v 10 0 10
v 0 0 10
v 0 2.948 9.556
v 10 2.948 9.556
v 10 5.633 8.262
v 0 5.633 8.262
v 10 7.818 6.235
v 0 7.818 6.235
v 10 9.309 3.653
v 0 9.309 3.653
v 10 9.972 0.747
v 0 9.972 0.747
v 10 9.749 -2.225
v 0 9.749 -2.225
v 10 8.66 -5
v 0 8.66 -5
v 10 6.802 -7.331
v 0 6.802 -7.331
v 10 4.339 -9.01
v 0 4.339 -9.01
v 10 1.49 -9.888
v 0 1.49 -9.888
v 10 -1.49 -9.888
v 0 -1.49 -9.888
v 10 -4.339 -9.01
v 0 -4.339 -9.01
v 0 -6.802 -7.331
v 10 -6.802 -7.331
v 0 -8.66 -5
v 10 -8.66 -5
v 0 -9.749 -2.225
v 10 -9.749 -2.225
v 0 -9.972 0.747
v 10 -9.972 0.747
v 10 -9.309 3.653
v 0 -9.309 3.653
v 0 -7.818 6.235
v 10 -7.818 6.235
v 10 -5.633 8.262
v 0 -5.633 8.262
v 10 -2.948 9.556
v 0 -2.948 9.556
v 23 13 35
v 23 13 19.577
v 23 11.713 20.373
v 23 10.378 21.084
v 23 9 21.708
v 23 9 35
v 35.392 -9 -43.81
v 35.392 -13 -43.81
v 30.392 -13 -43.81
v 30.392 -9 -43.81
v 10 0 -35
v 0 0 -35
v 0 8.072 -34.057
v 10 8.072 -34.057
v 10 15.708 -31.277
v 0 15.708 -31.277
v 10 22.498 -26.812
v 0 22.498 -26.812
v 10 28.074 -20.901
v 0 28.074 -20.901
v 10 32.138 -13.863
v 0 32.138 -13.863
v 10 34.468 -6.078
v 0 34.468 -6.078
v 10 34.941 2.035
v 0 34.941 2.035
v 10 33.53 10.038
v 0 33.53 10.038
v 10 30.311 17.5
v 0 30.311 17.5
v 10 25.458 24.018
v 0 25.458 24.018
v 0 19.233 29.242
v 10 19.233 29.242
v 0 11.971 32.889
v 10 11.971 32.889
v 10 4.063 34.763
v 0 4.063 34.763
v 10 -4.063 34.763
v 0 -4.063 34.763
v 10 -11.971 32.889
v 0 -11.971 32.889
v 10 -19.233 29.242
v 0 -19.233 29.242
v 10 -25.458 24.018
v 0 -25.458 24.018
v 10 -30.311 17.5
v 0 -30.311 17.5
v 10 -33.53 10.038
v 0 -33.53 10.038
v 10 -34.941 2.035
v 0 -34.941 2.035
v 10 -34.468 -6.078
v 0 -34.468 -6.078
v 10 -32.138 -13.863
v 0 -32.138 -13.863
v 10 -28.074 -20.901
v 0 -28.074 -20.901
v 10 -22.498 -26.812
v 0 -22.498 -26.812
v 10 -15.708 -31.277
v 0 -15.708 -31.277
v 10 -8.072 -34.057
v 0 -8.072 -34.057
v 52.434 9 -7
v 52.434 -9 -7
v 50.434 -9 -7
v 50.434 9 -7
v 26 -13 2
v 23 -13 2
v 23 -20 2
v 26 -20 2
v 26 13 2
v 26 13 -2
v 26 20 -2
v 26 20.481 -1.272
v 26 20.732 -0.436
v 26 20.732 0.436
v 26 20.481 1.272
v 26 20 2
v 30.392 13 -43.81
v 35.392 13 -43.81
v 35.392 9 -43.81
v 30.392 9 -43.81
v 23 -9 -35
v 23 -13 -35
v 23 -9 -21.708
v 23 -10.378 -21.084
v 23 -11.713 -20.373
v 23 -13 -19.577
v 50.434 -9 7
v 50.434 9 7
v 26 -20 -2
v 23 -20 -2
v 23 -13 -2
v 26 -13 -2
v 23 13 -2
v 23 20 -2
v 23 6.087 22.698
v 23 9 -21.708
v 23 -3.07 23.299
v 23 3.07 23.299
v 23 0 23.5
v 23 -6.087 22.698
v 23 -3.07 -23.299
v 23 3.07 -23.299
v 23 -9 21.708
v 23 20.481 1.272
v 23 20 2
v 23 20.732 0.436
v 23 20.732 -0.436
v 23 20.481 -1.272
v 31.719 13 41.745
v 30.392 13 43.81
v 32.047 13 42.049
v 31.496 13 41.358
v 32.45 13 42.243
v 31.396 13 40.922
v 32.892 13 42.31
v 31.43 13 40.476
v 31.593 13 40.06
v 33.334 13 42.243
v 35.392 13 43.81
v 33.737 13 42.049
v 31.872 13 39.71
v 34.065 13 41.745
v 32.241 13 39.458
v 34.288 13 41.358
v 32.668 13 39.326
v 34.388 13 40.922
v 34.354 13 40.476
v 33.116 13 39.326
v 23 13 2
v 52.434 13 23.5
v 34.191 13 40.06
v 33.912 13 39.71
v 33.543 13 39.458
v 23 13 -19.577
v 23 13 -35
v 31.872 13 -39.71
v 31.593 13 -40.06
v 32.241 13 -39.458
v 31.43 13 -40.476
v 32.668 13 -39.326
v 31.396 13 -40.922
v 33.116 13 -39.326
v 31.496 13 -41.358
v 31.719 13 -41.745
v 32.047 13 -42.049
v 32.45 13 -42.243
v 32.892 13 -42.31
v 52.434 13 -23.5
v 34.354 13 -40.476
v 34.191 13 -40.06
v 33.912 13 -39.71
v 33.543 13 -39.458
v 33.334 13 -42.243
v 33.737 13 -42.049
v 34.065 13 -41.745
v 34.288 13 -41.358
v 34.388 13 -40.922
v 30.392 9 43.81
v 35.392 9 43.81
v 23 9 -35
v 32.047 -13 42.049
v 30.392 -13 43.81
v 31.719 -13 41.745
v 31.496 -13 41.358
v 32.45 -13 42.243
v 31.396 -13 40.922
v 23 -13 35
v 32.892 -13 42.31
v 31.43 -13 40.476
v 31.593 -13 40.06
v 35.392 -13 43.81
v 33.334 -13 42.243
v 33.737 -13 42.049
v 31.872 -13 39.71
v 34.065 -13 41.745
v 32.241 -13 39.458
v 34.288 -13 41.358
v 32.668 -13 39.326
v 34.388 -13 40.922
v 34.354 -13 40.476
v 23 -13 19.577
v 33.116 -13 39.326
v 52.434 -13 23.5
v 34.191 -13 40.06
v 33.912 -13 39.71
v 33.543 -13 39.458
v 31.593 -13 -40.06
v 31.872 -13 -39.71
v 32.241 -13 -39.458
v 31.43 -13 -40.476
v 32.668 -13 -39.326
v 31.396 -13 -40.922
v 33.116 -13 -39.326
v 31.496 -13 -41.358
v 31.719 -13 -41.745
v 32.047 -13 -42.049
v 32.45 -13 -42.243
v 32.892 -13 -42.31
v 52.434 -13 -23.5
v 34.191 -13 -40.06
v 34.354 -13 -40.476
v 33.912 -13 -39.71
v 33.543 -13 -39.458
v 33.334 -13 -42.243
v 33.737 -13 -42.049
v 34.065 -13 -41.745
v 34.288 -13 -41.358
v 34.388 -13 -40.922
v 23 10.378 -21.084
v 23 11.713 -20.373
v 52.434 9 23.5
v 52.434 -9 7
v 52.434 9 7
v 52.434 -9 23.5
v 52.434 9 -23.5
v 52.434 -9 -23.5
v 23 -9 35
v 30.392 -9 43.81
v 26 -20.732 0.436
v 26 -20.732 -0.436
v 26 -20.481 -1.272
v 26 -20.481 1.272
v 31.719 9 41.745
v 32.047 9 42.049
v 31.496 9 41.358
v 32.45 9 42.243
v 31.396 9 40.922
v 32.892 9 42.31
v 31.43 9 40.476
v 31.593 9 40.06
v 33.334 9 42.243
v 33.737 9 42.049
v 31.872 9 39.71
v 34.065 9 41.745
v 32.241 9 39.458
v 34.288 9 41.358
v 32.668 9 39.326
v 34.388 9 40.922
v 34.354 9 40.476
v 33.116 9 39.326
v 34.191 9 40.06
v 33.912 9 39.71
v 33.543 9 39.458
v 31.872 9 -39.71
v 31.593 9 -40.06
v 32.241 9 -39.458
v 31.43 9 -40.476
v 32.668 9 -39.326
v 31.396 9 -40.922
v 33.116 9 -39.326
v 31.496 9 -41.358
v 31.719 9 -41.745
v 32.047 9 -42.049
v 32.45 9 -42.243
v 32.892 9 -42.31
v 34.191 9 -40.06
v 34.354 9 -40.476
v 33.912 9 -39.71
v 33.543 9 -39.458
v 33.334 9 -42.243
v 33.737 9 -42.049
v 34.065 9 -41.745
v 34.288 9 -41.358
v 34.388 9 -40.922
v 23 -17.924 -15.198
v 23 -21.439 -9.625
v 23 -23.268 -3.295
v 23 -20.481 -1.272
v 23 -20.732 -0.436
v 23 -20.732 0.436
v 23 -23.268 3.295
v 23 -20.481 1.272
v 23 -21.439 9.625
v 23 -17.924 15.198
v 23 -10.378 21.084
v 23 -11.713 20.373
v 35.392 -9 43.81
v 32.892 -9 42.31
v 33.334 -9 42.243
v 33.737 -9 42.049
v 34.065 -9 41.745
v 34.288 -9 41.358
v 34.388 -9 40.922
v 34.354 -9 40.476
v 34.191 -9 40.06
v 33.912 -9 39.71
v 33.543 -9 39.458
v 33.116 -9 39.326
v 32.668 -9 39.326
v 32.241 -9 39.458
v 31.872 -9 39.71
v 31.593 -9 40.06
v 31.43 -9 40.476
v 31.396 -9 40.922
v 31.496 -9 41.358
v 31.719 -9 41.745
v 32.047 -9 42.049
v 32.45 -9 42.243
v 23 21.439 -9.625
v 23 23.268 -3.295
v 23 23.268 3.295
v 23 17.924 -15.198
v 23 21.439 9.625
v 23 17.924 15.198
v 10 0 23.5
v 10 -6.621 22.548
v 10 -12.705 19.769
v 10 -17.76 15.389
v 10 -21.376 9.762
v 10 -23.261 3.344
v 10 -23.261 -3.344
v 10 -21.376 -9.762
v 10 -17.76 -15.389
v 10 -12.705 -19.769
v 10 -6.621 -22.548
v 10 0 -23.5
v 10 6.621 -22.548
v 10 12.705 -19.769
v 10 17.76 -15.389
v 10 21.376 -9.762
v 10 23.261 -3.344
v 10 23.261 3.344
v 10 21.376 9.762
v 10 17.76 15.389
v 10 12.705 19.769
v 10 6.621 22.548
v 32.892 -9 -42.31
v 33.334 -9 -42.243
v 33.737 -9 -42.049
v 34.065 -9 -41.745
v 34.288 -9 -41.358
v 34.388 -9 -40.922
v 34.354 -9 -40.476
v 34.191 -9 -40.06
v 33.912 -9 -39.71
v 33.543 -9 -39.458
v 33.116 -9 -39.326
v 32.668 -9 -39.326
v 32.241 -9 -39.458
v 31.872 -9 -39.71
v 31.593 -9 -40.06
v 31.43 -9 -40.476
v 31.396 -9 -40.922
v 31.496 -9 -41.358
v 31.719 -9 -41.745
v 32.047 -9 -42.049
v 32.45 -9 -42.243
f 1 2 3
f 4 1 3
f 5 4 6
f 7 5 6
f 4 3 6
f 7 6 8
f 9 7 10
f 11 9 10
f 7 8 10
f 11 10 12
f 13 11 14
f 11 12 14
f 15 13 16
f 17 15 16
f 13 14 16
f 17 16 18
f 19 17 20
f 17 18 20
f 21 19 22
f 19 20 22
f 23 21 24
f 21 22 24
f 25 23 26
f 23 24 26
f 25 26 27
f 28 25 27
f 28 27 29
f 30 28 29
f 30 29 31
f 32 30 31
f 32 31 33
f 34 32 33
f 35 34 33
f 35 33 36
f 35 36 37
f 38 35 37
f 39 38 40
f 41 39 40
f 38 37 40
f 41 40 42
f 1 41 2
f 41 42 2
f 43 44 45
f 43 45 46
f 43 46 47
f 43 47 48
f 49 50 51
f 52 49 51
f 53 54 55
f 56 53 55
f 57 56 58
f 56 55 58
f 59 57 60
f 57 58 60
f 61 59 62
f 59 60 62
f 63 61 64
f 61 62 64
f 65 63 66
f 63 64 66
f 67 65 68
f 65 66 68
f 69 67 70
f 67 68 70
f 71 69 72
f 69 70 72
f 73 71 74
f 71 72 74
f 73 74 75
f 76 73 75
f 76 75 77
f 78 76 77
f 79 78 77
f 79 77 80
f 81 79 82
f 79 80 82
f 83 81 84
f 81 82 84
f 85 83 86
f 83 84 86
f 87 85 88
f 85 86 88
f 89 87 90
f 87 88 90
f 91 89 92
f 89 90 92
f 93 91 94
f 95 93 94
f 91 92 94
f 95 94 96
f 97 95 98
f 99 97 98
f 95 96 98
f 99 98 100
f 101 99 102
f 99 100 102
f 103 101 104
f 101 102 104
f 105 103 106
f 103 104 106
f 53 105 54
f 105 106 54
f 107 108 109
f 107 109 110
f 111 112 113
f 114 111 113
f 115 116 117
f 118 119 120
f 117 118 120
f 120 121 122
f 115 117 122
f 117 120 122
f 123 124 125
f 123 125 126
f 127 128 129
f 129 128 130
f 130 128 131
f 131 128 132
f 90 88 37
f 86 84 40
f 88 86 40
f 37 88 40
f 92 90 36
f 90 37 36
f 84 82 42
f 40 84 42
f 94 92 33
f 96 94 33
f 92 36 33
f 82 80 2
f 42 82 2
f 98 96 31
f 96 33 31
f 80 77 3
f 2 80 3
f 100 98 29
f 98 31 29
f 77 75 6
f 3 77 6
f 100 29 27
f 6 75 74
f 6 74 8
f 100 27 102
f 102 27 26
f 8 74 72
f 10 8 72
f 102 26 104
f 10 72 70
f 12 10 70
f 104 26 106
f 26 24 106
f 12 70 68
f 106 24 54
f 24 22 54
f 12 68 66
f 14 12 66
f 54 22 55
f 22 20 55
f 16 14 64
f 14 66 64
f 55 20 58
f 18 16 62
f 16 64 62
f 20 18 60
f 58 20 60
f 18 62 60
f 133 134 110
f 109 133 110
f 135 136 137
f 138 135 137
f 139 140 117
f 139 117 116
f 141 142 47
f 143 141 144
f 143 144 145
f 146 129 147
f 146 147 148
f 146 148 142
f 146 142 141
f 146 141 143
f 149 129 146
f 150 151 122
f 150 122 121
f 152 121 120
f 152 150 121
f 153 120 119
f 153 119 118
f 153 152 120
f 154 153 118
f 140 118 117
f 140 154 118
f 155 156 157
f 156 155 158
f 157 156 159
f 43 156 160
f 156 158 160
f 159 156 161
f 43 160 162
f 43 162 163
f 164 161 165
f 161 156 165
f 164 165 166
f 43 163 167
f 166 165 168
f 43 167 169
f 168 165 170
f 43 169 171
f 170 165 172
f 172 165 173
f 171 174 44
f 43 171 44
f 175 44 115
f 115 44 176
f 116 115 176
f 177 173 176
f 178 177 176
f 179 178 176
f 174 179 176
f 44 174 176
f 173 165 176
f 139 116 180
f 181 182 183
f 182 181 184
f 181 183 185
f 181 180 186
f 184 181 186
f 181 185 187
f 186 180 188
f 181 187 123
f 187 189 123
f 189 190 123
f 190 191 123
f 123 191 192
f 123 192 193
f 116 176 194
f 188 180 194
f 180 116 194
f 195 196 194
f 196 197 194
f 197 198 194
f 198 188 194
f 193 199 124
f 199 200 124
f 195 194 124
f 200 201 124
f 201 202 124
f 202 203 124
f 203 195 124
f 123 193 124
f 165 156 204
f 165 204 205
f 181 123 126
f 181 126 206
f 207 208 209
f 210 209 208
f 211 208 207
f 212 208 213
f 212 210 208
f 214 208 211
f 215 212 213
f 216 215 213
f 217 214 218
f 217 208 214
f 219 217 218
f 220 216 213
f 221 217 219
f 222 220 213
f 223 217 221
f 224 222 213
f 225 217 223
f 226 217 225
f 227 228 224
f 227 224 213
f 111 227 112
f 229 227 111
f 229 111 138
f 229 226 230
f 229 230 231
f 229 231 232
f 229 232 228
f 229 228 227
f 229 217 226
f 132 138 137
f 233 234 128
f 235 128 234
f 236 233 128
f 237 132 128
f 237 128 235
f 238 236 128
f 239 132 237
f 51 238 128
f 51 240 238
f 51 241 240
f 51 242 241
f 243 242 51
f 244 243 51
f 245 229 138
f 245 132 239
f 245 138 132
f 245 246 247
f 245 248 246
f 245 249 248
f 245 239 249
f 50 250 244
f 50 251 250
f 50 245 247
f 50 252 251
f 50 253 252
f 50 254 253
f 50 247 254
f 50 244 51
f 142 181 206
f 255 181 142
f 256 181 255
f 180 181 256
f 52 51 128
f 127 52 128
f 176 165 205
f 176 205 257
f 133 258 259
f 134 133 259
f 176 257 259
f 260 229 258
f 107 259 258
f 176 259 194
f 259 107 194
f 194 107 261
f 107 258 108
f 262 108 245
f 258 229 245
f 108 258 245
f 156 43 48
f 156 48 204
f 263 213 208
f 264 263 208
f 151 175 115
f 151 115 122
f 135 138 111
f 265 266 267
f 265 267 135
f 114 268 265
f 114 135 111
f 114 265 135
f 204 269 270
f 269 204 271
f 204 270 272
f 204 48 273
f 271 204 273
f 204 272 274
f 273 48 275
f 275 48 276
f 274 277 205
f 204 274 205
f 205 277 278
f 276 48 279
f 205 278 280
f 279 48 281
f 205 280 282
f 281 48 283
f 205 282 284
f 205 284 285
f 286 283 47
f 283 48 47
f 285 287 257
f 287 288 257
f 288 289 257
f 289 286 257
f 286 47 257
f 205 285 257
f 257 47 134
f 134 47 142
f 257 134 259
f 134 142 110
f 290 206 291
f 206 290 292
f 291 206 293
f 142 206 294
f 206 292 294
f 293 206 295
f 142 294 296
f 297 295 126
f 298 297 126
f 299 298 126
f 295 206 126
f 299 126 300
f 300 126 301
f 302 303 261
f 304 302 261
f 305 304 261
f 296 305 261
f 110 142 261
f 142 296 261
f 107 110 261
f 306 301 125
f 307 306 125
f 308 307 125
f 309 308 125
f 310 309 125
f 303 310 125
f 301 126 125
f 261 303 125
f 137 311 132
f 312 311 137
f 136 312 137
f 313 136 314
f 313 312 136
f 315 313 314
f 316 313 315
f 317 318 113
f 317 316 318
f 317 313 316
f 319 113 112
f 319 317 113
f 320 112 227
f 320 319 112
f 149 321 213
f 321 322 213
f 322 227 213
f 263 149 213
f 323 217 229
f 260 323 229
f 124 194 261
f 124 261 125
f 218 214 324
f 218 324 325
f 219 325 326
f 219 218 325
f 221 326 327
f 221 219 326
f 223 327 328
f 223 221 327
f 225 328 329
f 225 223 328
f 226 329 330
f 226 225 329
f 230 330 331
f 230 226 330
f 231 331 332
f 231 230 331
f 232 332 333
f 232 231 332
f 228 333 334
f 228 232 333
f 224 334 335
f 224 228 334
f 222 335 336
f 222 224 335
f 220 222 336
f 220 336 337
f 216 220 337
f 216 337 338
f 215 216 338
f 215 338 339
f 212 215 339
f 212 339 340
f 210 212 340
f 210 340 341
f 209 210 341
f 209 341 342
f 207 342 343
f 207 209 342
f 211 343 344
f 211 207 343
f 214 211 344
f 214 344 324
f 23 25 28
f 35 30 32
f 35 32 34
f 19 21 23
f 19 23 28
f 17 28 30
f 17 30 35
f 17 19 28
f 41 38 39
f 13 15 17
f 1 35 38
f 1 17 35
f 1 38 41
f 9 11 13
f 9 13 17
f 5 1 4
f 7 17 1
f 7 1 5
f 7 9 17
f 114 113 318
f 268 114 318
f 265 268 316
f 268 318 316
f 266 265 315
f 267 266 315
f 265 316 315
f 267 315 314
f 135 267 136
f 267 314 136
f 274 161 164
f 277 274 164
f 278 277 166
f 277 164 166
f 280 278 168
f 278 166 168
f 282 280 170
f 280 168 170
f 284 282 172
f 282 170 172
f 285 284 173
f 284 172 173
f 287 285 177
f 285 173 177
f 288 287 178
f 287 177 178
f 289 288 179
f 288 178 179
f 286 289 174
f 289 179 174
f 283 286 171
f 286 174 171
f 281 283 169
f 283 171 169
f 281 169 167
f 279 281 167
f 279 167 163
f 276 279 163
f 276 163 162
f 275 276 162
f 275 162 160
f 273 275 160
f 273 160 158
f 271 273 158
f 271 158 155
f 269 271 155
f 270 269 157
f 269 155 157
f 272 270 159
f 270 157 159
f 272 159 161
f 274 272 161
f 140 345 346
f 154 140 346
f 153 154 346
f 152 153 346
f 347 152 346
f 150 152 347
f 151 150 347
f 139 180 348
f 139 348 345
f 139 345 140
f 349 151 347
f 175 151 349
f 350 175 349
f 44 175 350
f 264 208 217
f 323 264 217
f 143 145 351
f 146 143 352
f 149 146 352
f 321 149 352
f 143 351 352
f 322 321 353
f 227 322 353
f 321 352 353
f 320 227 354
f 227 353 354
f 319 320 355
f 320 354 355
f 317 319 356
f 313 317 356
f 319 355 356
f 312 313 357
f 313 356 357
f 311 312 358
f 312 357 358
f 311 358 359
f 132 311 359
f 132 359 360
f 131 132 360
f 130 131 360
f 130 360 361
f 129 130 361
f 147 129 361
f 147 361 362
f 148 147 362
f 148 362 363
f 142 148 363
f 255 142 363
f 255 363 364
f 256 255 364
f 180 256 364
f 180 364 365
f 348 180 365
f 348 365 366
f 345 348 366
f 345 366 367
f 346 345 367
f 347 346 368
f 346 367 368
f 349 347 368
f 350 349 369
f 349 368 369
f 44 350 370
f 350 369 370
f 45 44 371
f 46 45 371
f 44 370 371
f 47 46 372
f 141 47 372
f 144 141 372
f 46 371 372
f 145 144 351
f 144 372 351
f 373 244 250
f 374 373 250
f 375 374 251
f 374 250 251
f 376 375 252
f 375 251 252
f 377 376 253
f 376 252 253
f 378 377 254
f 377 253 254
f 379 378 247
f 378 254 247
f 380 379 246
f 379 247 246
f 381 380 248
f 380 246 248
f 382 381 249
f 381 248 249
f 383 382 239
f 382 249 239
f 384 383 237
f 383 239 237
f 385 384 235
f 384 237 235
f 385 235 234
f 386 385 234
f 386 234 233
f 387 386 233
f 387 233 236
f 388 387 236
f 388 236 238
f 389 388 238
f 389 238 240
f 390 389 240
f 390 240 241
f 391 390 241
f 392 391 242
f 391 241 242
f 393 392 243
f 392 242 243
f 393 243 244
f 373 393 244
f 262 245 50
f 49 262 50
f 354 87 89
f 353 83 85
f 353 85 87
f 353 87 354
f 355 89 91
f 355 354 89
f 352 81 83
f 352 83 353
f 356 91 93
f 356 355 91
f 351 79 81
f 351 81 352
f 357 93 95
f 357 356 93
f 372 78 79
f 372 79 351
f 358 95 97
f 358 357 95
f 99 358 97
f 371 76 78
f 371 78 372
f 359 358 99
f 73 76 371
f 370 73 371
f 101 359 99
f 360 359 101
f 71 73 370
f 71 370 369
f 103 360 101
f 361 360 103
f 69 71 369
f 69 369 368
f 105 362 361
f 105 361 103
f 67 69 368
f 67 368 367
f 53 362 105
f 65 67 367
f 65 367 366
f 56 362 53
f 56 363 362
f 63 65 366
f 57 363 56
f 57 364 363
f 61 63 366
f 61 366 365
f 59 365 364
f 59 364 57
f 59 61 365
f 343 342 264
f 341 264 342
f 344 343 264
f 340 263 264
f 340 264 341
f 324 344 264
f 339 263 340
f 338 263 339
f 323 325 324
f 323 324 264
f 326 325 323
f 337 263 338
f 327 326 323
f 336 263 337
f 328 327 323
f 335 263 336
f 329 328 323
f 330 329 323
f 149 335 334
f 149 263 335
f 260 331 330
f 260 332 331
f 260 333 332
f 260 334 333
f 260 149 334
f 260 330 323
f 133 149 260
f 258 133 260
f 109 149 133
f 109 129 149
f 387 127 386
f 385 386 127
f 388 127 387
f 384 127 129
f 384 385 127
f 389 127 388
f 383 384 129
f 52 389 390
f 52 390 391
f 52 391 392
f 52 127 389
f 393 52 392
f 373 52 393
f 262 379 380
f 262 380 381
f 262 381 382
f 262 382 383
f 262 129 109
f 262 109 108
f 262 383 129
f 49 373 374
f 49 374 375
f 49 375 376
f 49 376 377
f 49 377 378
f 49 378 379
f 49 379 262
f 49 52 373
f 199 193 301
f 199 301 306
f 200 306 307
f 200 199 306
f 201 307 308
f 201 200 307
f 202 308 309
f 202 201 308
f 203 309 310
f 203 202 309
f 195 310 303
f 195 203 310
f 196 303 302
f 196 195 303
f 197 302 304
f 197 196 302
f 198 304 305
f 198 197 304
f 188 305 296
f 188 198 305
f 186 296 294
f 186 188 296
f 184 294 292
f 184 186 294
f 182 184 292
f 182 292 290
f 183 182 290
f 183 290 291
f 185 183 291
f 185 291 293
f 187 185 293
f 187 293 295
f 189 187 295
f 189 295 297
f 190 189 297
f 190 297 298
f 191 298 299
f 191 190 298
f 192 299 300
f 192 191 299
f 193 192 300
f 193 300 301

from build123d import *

# Parameters (mm, degrees)
SKETCH1_R               = 35
BOSS_EXTRUDE1_DEPTH     = 10
SKETCH2_R               = 23.5
BOSS_EXTRUDE2_DEPTH     = 13
BOSS_EXTRUDE3_DEPTH     = 4
SKETCH4_R               = 1.5
CUT_EXTRUDE1_DEPTH      = 4
MIRROR2_COPY_1_SKETCH_R = 1.5
MIRROR2_COPY_1_DEPTH    = 4
BOSS_EXTRUDE4_DEPTH     = 3
SKETCH6_W               = 14
SKETCH6_H               = 26
BOSS_EXTRUDE5_DEPTH     = 2
SKETCH7_R               = 10
CUT_EXTRUDE2_DEPTH      = 10


with BuildPart() as part:
    # Sketch1 → Boss-Extrude1 (new body)
    with BuildSketch(Plane(origin=(0, 0, 0), x_dir=(0, 0, -1), z_dir=(1, 0, 0))):
        Circle(SKETCH1_R)
    extrude(amount=BOSS_EXTRUDE1_DEPTH)

    # Sketch2 → Boss-Extrude2 (add)
    with BuildSketch(Plane(origin=(10, 0, 0), x_dir=(0, 0, -1), z_dir=(1, 0, 0))):
        with Locations(Location((0, 0, 0), (0, 0, 180))):
            Circle(SKETCH2_R)
    extrude(amount=BOSS_EXTRUDE2_DEPTH)

    # Sketch3 → Boss-Extrude3 (add)
    with BuildSketch(Plane(origin=(0, 13, 0), x_dir=(1, 0, 0), z_dir=(0, 1, 0))):
        Polygon((23, 35), (23, -35), (30.392057511, -43.809511096), (35.392057511, -43.809511096), (52.433760781, -23.5), (52.433760781, 23.5), (35.392057511, 43.809511096), (30.392057511, 43.809511096), align=None)
    boss_extrude3 = extrude(amount=-BOSS_EXTRUDE3_DEPTH)

    # Sketch4 → Cut-Extrude1 (cut)
    with BuildSketch(Plane(origin=(0, 13, 0), x_dir=(1, 0, 0), z_dir=(0, 1, 0))):
        with Locations(Location((32.892057511, -40.809511096, 0), (0, 0, 270))):
            Circle(SKETCH4_R)
    cut_extrude1 = extrude(amount=-CUT_EXTRUDE1_DEPTH, mode=Mode.SUBTRACT)

    # Mirror1: Cut-Extrude1 across plane
    add(cut_extrude1.mirror(Plane.XY), mode=Mode.SUBTRACT)

    # Mirror2: Boss-Extrude3, Cut-Extrude1 across plane
    add(boss_extrude3.mirror(Plane.ZX))
    add(cut_extrude1.mirror(Plane.ZX), mode=Mode.SUBTRACT)

    # Mirror2 copy 1 sketch → Mirror2 copy 1 (cut)
    with BuildSketch(Plane.XZ.offset(13)):
        with Locations(Location((32.892057511, -40.809511096, 0), (0, 0, 270))):
            Circle(MIRROR2_COPY_1_SKETCH_R)
    extrude(amount=-MIRROR2_COPY_1_DEPTH, mode=Mode.SUBTRACT)

    # Sketch5 → Boss-Extrude4 (add)
    with BuildSketch(Plane(origin=(23, 0, 0), x_dir=(0, 0, -1), z_dir=(1, 0, 0))):
        with BuildLine():
            Line((-2, 13), (-2, 20))
            ThreePointArc((-2, 20), (0, 20.763932023), (2, 20))
            Line((2, 20), (2, 13))
            Line((2, 13), (-2, 13))
        make_face()
    boss_extrude4 = extrude(amount=BOSS_EXTRUDE4_DEPTH)

    # Mirror3: Boss-Extrude4 across plane
    add(boss_extrude4.mirror(Plane.ZX))

    # Sketch6 → Boss-Extrude5 (add)
    with BuildSketch(Plane(origin=(52.433760781, 0, 0), x_dir=(0, 0, -1), z_dir=(1, 0, 0))):
        Rectangle(SKETCH6_W, SKETCH6_H)
    extrude(amount=-BOSS_EXTRUDE5_DEPTH)

    # Sketch7 → Cut-Extrude2 (cut)
    with BuildSketch(Plane.ZY):
        Circle(SKETCH7_R)
    extrude(amount=-CUT_EXTRUDE2_DEPTH, mode=Mode.SUBTRACT)


solid = part.part
